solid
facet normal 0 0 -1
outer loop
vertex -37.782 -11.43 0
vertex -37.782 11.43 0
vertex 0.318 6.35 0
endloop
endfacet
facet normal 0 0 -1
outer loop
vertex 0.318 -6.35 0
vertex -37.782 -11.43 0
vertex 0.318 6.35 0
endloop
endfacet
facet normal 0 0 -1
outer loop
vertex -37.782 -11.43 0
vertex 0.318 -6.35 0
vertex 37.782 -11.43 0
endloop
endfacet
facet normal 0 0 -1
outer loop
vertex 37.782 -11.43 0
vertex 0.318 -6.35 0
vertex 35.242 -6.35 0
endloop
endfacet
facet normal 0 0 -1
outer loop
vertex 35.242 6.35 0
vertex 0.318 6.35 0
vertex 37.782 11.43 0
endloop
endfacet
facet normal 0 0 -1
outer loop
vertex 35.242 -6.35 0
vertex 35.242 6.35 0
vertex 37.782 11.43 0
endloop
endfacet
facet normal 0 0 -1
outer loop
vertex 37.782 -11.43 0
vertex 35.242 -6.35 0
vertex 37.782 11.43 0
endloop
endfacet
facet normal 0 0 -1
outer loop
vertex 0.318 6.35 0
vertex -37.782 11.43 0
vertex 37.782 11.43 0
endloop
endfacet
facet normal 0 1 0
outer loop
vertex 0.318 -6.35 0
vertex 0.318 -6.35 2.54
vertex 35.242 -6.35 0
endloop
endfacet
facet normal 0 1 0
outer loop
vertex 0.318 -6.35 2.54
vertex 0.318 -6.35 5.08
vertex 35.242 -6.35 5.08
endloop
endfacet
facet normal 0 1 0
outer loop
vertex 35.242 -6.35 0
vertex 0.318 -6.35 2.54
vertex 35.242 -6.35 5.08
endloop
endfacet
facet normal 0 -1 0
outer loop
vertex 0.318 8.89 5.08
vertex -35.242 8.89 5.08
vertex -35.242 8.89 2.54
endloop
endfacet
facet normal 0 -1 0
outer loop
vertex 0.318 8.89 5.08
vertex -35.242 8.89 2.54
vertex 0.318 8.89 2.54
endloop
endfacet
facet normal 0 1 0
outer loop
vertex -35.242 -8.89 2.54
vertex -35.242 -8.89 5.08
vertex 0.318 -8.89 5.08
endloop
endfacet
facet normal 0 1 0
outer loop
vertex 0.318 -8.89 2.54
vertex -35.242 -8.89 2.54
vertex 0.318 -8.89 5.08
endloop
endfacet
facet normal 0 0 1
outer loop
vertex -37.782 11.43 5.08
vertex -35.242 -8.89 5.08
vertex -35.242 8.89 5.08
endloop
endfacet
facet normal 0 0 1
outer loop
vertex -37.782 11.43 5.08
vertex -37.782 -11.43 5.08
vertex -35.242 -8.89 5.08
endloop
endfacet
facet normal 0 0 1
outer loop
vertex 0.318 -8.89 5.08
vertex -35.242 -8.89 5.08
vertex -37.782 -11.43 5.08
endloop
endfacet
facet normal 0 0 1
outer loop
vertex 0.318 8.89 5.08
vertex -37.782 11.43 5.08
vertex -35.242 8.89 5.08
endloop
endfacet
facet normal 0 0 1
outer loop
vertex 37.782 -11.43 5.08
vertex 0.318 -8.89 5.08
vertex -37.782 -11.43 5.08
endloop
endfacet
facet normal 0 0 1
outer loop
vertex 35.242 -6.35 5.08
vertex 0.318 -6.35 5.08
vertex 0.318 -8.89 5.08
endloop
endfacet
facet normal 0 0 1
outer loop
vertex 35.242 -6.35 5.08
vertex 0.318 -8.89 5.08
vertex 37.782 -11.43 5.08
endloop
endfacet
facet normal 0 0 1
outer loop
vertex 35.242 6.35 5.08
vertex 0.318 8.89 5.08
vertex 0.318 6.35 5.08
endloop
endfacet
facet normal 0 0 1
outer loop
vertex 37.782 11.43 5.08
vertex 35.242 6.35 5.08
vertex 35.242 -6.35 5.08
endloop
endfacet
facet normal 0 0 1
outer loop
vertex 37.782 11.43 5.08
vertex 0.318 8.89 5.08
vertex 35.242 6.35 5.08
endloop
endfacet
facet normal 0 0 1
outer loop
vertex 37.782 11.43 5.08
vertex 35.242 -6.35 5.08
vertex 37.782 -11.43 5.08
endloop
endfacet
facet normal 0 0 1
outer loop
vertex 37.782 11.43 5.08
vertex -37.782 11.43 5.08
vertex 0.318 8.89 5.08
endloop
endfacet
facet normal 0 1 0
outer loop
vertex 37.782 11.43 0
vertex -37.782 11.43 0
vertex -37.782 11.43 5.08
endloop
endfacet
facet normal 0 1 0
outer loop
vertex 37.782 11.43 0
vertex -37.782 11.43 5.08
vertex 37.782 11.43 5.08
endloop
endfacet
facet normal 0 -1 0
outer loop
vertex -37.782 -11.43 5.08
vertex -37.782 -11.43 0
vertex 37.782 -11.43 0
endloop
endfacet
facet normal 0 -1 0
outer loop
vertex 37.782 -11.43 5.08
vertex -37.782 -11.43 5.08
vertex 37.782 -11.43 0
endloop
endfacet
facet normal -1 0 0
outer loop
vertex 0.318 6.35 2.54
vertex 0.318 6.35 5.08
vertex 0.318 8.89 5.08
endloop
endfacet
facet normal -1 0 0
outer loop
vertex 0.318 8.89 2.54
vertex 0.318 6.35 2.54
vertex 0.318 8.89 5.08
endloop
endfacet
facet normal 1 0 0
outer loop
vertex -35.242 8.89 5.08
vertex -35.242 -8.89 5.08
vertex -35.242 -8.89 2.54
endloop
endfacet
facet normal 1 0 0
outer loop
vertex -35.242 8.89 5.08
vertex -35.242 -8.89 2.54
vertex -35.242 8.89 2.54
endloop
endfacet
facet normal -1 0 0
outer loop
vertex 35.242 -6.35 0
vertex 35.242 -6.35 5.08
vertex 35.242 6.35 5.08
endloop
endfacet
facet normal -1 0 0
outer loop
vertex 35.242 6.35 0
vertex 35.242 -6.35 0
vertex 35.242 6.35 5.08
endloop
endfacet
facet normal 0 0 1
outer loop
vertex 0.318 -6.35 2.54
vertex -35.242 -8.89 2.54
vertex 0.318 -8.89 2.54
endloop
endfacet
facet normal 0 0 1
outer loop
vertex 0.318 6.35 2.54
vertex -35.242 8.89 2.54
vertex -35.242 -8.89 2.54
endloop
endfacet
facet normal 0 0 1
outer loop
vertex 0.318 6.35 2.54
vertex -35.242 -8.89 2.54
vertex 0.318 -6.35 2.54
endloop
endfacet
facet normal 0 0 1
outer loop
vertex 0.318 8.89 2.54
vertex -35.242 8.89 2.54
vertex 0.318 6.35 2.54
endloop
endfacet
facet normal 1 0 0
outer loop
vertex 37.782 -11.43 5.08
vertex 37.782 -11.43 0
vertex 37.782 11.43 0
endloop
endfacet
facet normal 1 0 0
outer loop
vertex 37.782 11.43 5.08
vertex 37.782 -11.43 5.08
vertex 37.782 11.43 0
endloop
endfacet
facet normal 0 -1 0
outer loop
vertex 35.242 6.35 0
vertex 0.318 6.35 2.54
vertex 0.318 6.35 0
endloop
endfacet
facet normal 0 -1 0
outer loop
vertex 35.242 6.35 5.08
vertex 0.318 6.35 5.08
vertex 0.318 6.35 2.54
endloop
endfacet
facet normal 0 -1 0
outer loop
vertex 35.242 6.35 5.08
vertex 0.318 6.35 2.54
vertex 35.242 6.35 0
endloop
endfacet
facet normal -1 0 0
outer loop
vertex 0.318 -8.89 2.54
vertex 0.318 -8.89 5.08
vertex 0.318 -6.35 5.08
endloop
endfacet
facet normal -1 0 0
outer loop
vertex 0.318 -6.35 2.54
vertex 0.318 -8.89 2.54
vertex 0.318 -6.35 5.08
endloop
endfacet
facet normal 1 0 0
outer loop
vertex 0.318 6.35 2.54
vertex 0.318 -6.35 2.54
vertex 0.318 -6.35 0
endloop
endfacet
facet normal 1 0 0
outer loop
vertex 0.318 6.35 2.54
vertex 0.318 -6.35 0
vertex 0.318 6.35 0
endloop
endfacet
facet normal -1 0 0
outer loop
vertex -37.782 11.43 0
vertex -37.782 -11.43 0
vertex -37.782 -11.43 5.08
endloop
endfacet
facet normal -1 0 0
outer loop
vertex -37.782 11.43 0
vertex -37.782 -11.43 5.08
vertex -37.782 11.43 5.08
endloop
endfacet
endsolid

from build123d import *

# Parameters (mm, degrees)
SKETCH1_W           = 75.565
SKETCH1_H           = 22.86
BOSS_EXTRUDE1_DEPTH = 5.08
SKETCH2_W           = 35.56
SKETCH2_H           = 17.78
CUT_EXTRUDE1_DEPTH  = 2.54
SKETCH3_W           = 34.925
SKETCH3_H           = 12.7
CUT_EXTRUDE2_DEPTH  = 40.799103083


with BuildPart() as part:
    # Sketch1 → Boss-Extrude1 (new body)
    with BuildSketch(Plane.XY):
        Rectangle(SKETCH1_W, SKETCH1_H)
    extrude(amount=BOSS_EXTRUDE1_DEPTH)

    # Sketch2 → Cut-Extrude1 (cut)
    with BuildSketch(Plane.XY.offset(5.08)):
        with Locations((-17.4625, 0)):
            Rectangle(SKETCH2_W, SKETCH2_H)
    extrude(amount=-CUT_EXTRUDE1_DEPTH, mode=Mode.SUBTRACT)

    # Sketch3 → Cut-Extrude2 (cut, through all)
    with BuildSketch(Plane.XY.offset(5.08)):
        with Locations((17.78, 0)):
            Rectangle(SKETCH3_W, SKETCH3_H)
    extrude(amount=-CUT_EXTRUDE2_DEPTH, mode=Mode.SUBTRACT)


solid = part.part
